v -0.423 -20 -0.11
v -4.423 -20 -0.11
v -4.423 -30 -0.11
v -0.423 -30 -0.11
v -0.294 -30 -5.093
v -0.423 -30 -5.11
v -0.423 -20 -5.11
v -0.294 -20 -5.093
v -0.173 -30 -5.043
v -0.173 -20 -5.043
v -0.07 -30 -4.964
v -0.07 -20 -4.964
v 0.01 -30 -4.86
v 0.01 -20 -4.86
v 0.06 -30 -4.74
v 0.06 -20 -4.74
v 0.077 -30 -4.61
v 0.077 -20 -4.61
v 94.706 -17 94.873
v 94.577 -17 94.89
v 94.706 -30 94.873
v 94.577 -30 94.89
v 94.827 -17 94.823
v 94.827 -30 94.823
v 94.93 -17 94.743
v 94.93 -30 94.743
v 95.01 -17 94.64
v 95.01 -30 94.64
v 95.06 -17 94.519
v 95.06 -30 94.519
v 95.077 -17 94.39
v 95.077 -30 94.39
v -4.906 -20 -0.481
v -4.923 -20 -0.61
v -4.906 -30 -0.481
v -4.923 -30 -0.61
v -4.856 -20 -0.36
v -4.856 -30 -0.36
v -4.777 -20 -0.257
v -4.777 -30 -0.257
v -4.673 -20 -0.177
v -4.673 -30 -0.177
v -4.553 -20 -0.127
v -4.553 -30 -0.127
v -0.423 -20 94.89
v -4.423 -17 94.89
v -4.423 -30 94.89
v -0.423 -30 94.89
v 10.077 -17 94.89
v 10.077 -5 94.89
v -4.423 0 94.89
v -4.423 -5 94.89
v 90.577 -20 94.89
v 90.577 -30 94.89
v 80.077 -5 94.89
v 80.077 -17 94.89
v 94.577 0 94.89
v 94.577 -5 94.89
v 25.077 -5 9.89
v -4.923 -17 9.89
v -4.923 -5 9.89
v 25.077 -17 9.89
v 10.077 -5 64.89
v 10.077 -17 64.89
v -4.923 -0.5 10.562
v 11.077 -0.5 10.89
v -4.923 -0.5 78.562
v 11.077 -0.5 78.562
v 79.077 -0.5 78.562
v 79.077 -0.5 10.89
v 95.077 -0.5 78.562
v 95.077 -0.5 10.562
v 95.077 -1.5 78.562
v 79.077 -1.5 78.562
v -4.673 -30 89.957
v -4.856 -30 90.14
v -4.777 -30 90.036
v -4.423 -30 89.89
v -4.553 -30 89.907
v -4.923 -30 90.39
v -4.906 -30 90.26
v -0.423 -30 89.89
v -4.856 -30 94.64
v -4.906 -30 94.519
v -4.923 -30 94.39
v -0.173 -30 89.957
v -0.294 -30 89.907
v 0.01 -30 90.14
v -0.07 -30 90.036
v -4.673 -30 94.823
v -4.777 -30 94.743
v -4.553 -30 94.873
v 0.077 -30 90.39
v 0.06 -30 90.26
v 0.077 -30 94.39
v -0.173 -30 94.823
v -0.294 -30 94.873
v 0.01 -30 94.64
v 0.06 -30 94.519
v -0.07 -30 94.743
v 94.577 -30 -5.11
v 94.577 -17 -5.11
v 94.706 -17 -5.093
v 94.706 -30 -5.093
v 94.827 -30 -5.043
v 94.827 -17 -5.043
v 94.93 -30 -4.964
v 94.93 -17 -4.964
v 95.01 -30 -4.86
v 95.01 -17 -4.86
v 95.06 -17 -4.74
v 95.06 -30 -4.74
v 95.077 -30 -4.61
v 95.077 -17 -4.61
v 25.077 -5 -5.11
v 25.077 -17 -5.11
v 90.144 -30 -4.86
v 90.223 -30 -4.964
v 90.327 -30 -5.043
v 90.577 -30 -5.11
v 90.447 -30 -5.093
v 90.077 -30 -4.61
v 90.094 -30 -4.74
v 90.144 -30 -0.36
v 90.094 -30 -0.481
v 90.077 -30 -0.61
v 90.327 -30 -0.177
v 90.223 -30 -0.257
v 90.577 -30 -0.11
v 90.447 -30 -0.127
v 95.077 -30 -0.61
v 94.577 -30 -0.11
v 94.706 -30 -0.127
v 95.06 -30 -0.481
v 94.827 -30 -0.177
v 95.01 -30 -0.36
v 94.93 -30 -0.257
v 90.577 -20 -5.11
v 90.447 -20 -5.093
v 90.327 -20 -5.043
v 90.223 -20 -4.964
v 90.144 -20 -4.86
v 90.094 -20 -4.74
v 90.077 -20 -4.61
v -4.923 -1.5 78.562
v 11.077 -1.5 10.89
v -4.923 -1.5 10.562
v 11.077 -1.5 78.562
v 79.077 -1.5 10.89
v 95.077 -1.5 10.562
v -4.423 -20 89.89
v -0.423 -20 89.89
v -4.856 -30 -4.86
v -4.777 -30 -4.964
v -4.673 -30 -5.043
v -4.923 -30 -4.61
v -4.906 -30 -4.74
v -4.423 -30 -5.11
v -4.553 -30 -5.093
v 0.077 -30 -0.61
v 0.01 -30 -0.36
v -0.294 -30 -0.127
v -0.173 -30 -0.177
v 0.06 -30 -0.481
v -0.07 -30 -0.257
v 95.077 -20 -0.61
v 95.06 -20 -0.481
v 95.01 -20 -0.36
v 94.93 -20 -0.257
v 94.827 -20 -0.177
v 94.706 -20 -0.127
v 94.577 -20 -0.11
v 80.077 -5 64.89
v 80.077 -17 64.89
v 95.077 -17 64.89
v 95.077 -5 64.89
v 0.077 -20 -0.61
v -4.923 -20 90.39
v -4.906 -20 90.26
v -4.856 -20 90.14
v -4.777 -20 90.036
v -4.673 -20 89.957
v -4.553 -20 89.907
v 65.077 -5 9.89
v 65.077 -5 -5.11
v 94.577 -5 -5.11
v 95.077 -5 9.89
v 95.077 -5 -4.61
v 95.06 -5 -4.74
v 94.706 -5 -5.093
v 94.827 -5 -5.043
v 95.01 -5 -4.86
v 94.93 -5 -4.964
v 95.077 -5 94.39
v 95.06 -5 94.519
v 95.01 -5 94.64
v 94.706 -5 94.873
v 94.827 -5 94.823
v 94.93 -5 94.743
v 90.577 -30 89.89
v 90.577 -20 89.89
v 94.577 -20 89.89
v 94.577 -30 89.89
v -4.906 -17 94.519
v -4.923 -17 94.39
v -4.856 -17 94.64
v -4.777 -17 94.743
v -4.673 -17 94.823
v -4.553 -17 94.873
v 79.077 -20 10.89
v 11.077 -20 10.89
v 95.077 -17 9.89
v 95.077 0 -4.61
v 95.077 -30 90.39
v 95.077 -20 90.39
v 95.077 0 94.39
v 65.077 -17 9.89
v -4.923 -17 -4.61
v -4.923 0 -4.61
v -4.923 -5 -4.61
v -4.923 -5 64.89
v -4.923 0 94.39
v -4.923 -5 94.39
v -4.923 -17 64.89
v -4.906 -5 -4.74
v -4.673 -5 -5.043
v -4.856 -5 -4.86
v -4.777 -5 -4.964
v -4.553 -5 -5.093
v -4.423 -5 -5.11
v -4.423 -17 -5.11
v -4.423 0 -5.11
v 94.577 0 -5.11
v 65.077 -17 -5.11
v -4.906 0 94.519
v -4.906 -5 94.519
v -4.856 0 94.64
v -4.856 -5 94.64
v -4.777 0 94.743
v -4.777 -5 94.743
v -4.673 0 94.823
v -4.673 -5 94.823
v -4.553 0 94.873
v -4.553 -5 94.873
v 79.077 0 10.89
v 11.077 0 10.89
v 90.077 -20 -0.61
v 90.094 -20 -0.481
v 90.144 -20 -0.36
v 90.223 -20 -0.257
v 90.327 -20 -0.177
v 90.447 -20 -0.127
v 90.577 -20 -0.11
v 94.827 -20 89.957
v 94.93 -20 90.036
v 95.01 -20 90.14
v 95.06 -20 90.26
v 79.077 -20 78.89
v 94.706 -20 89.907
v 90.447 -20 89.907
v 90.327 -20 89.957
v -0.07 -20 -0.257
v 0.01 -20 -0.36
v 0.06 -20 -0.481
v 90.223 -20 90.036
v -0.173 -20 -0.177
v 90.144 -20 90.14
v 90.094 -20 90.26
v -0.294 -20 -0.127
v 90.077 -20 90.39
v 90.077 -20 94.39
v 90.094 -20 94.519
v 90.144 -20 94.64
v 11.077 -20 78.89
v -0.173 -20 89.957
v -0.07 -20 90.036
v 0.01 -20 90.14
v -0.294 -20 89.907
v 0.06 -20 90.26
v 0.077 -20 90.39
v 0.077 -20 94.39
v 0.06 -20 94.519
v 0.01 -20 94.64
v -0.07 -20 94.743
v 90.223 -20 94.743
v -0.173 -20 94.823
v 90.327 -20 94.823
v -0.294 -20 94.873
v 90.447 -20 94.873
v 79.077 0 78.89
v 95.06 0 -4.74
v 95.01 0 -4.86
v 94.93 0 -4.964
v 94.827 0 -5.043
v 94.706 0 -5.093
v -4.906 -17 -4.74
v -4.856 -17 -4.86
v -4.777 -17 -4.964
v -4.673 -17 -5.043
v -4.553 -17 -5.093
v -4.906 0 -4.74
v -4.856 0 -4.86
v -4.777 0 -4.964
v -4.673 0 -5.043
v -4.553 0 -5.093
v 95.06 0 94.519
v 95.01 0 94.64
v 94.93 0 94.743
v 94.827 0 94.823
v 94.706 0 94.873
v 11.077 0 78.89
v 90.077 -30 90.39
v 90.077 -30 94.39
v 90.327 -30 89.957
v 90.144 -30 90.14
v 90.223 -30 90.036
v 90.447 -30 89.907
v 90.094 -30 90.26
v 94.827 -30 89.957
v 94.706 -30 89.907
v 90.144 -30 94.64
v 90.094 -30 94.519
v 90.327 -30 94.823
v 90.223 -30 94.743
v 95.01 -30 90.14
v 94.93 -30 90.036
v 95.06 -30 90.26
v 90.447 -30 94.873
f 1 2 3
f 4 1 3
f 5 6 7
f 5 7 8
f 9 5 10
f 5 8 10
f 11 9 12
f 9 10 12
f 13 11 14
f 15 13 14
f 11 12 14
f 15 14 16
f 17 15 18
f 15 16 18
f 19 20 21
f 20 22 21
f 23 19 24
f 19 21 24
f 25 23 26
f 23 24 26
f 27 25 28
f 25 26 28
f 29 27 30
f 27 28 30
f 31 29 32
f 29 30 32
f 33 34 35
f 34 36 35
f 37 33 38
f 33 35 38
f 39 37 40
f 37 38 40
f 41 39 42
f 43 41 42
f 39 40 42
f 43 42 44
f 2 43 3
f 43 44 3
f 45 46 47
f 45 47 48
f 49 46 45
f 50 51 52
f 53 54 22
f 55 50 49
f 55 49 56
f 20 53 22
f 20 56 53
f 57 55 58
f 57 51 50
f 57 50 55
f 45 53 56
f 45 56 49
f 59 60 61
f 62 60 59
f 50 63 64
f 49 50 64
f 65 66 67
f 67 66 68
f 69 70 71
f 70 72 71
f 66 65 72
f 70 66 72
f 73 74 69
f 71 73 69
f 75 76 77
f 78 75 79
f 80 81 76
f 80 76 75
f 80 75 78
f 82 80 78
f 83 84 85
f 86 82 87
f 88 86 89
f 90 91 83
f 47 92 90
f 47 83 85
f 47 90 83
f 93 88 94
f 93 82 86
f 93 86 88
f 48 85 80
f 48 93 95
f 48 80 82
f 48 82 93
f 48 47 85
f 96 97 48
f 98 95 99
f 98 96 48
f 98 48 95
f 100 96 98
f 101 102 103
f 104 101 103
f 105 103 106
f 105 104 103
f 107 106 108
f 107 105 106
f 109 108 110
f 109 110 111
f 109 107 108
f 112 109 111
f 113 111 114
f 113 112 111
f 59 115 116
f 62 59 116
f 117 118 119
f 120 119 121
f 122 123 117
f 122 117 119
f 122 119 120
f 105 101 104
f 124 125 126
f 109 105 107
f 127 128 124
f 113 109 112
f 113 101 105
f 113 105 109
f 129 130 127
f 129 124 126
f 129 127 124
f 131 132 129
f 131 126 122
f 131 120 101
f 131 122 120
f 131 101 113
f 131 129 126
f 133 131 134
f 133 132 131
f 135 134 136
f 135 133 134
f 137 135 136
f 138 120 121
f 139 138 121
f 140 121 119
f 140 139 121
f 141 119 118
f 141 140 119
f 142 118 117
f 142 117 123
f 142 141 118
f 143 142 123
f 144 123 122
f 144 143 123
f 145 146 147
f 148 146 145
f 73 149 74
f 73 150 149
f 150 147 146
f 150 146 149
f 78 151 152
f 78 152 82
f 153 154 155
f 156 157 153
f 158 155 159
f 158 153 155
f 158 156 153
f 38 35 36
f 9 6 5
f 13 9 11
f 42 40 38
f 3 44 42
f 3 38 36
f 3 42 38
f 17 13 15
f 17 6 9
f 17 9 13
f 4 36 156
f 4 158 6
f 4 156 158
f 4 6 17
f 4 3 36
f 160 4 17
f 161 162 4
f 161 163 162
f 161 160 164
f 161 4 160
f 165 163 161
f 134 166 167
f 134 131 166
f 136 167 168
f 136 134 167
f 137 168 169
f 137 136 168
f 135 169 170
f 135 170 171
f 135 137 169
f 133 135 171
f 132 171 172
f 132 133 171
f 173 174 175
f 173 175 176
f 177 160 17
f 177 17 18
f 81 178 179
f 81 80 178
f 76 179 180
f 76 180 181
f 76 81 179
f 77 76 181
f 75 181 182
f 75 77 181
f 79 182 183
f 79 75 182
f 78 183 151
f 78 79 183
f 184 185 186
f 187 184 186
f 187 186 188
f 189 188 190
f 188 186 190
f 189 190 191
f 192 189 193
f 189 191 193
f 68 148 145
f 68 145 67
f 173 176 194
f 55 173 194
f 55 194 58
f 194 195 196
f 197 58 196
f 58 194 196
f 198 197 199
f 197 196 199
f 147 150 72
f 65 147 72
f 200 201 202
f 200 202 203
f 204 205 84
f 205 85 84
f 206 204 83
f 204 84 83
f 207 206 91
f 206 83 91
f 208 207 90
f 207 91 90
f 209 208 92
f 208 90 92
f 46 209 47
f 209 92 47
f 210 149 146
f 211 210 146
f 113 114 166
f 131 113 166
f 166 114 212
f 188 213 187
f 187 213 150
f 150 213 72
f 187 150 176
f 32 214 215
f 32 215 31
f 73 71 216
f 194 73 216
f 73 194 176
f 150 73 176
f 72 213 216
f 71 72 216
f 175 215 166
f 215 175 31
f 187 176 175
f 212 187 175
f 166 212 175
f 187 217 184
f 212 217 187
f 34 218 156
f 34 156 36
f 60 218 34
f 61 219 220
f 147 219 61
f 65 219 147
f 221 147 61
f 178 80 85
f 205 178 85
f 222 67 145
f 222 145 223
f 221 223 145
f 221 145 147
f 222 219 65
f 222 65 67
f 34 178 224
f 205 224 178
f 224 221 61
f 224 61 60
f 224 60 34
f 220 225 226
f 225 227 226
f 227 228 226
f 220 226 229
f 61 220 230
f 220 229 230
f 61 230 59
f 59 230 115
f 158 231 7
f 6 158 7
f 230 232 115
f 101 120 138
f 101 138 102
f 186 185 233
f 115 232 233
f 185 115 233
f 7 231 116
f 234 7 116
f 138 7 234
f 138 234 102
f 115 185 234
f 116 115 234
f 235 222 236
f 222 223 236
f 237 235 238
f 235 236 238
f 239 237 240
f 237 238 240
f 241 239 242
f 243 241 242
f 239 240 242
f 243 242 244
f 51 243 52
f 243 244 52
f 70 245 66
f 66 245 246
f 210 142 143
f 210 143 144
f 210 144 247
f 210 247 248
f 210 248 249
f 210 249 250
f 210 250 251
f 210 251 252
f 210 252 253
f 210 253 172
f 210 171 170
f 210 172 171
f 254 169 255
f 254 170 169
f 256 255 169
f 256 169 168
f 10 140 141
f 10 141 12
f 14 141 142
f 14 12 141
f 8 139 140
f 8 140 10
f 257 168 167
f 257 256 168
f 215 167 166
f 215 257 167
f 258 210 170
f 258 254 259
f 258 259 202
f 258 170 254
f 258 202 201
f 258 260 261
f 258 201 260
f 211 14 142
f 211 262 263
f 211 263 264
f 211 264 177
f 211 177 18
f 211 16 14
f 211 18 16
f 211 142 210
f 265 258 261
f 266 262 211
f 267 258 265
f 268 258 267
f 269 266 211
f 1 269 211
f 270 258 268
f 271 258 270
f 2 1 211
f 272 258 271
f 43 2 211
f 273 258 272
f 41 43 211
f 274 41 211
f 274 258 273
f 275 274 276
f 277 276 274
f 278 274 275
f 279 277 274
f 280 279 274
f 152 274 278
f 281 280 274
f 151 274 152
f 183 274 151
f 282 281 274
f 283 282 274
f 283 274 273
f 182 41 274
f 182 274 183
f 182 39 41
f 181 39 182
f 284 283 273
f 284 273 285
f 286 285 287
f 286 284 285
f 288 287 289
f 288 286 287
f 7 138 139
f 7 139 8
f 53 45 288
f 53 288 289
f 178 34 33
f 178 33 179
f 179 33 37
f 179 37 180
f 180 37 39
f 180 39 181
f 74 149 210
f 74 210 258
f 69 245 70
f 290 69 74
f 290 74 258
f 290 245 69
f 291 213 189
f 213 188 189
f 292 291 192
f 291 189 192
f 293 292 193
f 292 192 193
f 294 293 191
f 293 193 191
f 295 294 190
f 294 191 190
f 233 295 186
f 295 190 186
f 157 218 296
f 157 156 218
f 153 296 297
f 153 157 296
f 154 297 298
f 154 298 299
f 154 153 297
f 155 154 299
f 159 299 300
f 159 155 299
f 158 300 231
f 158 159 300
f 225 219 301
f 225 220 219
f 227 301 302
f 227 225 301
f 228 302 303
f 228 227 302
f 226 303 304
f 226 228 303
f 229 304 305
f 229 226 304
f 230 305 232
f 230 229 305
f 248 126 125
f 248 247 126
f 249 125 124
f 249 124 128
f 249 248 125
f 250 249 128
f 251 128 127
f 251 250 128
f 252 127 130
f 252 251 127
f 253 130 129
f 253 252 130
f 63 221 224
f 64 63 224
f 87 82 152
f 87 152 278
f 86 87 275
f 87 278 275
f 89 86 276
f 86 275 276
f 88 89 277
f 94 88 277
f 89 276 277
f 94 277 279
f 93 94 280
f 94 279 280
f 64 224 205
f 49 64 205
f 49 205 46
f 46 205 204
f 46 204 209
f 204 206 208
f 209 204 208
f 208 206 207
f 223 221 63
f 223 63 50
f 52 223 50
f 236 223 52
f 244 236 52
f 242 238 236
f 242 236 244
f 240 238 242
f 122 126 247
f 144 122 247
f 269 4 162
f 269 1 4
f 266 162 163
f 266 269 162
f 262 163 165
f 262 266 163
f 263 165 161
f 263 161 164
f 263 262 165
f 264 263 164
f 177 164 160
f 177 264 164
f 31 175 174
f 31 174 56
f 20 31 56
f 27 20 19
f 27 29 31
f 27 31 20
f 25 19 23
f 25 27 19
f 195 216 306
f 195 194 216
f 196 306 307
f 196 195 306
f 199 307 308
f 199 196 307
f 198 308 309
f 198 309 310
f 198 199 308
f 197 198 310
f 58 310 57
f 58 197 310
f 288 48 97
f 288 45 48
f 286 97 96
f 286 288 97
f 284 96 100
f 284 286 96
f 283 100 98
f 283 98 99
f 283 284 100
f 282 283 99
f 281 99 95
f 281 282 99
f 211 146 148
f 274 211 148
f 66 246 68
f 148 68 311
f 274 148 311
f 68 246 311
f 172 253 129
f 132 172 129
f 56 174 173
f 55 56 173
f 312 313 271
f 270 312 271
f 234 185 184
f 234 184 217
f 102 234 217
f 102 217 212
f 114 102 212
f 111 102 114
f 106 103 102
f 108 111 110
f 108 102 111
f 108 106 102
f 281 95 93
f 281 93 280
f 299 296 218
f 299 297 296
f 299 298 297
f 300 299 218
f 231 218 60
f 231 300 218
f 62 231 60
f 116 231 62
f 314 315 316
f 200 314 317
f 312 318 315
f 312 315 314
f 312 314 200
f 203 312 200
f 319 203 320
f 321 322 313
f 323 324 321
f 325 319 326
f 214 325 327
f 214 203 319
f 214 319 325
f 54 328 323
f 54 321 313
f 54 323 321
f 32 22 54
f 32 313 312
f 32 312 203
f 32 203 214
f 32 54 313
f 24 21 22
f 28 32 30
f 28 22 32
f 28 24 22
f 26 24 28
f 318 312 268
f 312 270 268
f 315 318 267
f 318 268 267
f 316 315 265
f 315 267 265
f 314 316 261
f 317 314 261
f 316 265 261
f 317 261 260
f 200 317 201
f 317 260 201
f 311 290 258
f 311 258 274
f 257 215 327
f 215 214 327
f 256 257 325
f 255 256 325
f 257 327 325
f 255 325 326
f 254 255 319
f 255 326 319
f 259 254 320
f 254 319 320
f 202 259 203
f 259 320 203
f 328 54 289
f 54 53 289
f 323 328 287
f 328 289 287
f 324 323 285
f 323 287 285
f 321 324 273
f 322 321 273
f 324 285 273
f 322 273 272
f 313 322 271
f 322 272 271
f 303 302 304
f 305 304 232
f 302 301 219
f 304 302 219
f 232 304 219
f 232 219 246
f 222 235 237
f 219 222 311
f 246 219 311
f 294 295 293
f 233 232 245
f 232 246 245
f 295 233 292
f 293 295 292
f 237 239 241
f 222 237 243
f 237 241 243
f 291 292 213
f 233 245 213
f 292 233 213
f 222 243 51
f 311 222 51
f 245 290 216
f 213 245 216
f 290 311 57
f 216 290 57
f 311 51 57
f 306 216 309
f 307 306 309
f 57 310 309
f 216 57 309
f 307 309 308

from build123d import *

# Parameters (mm, degrees)
F0_W      = 1000
F0_H      = 1000
F1_DEPTH  = 300
F2_W      = 900
F2_H      = 100
F3_DEPTH  = 1000.001
F4_W      = 100
F4_H      = 900
F5_DEPTH  = 1000.001
F6_W      = 300
F6_H      = 120
F7_DEPTH  = 150
F8_W      = 300
F8_H      = 120
F9_DEPTH  = 150
F10_W     = 120
F10_H     = 300
F11_DEPTH = 150
F12_W     = 120
F12_H     = 300
F13_DEPTH = 150
F14_R     = 5
F15_R     = 5
F16_W     = 680
F16_H     = 680
F17_DEPTH = 300.001
F18_W     = 10
F18_H     = 680
F19_DEPTH = 160.001
F20_DEPTH = 840.001
F21_SCALE = 0.1


with BuildPart() as f1:
    # F0 (on Front) → F1 (new body)
    with BuildSketch(Plane.XZ):
        with Locations((450.7653813809, 448.8989327101)):
            Rectangle(F0_W, F0_H)
    extrude(amount=F1_DEPTH)

    # F2 (on face) → F3 (cut, through all)
    with BuildSketch(Plane.XY.offset(948.8989327101)):
        with Locations((450.7653813809, -250)):
            Rectangle(F2_W, F2_H)
    extrude(amount=-F3_DEPTH, mode=Mode.SUBTRACT)

    # F4 (on face) → F5 (cut, through all)
    with BuildSketch(Plane(origin=(-49.2346186191, 0, 0), x_dir=(0, -1, 0), z_dir=(-1, 0, 0))):
        with Locations((250, 448.8989327101)):
            Rectangle(F4_W, F4_H)
    extrude(amount=-F5_DEPTH, mode=Mode.SUBTRACT)

    # F6 (on face) → F7 (cut)
    with BuildSketch(Plane(origin=(0, 0, -51.1010672899), x_dir=(1, 0, 0), z_dir=(0, 0, -1))):
        with Locations((100.7653813809, 110)):
            Rectangle(F6_W, F6_H)
    extrude(amount=-F7_DEPTH, mode=Mode.SUBTRACT)

    # F8 (on face) → F9 (cut)
    with BuildSketch(Plane(origin=(0, 0, -51.1010672899), x_dir=(1, 0, 0), z_dir=(0, 0, -1))):
        with Locations((800.7653813809, 110)):
            Rectangle(F8_W, F8_H)
    extrude(amount=-F9_DEPTH, mode=Mode.SUBTRACT)

    # F10 (on face) → F11 (cut)
    with BuildSketch(Plane.YZ.offset(950.7653813809)):
        with Locations((-110, 798.8989327101)):
            Rectangle(F10_W, F10_H)
    extrude(amount=-F11_DEPTH, mode=Mode.SUBTRACT)

    # F12 (on face) → F13 (cut)
    with BuildSketch(Plane(origin=(-49.2346186191, 0, 0), x_dir=(0, -1, 0), z_dir=(-1, 0, 0))):
        with Locations((110, 798.8989327101)):
            Rectangle(F12_W, F12_H)
    extrude(amount=-F13_DEPTH, mode=Mode.SUBTRACT)

    # F14
    f14_edges = [f1.edges().sort_by_distance(p)[0] for p in [
        (950.765381, -235, -51.101067),
        (900.765381, -250, -51.101067),
        (950.765381, -250, -1.101067),
        (900.765381, -250, -1.101067),
        (-49.234619, -235, -51.101067),
        (0.765381, -250, -51.101067),
        (-49.234619, -250, -1.101067),
        (0.765381, -250, -1.101067),
        (-49.234619, -235, 948.898933),
        (0.765381, -250, 948.898933),
        (-49.234619, -250, 898.898933),
        (0.765381, -250, 898.898933),
        (950.765381, -235, 948.898933),
        (950.765381, -250, 898.898933),
        (900.765381, -250, 898.898933),
        (900.765381, -250, 948.898933),
    ]]
    fillet(f14_edges, radius=F14_R)

    # F15
    f15_edges = [f1.edges().sort_by_distance(p)[0] for p in [
        (950.765381, -25, 948.898933),
        (950.765381, -25, -51.101067),
        (-49.234619, -25, -51.101067),
        (-49.234619, -25, 948.898933),
    ]]
    fillet(f15_edges, radius=F15_R)

    # F16 (on face) → F17 (cut, through all)
    with BuildSketch(Plane(origin=(0, 0, 0), x_dir=(-1, 0, 0), z_dir=(0, 1, 0))):
        with Locations((-450.7653813809, 448.8989327101)):
            Rectangle(F16_W, F16_H)
    extrude(amount=-F17_DEPTH, mode=Mode.SUBTRACT)

    # F18 (on face) → F19 (cut, through all)
    with BuildSketch(Plane.YZ.offset(110.7653813809)):
        with Locations((-10, 445.622831583)):
            Rectangle(F18_W, F18_H)
    extrude(amount=-F19_DEPTH, mode=Mode.SUBTRACT)

    # F18 (on face) → F20 (cut, through all)
    with BuildSketch(Plane.YZ.offset(110.7653813809)):
        with Locations((-10, 445.622831583)):
            Rectangle(F18_W, F18_H)
    extrude(amount=F20_DEPTH, mode=Mode.SUBTRACT)


with BuildPart() as f1_1:
    # F21: moved
    add(f1.part.scale(F21_SCALE))


solid = f1_1.part
